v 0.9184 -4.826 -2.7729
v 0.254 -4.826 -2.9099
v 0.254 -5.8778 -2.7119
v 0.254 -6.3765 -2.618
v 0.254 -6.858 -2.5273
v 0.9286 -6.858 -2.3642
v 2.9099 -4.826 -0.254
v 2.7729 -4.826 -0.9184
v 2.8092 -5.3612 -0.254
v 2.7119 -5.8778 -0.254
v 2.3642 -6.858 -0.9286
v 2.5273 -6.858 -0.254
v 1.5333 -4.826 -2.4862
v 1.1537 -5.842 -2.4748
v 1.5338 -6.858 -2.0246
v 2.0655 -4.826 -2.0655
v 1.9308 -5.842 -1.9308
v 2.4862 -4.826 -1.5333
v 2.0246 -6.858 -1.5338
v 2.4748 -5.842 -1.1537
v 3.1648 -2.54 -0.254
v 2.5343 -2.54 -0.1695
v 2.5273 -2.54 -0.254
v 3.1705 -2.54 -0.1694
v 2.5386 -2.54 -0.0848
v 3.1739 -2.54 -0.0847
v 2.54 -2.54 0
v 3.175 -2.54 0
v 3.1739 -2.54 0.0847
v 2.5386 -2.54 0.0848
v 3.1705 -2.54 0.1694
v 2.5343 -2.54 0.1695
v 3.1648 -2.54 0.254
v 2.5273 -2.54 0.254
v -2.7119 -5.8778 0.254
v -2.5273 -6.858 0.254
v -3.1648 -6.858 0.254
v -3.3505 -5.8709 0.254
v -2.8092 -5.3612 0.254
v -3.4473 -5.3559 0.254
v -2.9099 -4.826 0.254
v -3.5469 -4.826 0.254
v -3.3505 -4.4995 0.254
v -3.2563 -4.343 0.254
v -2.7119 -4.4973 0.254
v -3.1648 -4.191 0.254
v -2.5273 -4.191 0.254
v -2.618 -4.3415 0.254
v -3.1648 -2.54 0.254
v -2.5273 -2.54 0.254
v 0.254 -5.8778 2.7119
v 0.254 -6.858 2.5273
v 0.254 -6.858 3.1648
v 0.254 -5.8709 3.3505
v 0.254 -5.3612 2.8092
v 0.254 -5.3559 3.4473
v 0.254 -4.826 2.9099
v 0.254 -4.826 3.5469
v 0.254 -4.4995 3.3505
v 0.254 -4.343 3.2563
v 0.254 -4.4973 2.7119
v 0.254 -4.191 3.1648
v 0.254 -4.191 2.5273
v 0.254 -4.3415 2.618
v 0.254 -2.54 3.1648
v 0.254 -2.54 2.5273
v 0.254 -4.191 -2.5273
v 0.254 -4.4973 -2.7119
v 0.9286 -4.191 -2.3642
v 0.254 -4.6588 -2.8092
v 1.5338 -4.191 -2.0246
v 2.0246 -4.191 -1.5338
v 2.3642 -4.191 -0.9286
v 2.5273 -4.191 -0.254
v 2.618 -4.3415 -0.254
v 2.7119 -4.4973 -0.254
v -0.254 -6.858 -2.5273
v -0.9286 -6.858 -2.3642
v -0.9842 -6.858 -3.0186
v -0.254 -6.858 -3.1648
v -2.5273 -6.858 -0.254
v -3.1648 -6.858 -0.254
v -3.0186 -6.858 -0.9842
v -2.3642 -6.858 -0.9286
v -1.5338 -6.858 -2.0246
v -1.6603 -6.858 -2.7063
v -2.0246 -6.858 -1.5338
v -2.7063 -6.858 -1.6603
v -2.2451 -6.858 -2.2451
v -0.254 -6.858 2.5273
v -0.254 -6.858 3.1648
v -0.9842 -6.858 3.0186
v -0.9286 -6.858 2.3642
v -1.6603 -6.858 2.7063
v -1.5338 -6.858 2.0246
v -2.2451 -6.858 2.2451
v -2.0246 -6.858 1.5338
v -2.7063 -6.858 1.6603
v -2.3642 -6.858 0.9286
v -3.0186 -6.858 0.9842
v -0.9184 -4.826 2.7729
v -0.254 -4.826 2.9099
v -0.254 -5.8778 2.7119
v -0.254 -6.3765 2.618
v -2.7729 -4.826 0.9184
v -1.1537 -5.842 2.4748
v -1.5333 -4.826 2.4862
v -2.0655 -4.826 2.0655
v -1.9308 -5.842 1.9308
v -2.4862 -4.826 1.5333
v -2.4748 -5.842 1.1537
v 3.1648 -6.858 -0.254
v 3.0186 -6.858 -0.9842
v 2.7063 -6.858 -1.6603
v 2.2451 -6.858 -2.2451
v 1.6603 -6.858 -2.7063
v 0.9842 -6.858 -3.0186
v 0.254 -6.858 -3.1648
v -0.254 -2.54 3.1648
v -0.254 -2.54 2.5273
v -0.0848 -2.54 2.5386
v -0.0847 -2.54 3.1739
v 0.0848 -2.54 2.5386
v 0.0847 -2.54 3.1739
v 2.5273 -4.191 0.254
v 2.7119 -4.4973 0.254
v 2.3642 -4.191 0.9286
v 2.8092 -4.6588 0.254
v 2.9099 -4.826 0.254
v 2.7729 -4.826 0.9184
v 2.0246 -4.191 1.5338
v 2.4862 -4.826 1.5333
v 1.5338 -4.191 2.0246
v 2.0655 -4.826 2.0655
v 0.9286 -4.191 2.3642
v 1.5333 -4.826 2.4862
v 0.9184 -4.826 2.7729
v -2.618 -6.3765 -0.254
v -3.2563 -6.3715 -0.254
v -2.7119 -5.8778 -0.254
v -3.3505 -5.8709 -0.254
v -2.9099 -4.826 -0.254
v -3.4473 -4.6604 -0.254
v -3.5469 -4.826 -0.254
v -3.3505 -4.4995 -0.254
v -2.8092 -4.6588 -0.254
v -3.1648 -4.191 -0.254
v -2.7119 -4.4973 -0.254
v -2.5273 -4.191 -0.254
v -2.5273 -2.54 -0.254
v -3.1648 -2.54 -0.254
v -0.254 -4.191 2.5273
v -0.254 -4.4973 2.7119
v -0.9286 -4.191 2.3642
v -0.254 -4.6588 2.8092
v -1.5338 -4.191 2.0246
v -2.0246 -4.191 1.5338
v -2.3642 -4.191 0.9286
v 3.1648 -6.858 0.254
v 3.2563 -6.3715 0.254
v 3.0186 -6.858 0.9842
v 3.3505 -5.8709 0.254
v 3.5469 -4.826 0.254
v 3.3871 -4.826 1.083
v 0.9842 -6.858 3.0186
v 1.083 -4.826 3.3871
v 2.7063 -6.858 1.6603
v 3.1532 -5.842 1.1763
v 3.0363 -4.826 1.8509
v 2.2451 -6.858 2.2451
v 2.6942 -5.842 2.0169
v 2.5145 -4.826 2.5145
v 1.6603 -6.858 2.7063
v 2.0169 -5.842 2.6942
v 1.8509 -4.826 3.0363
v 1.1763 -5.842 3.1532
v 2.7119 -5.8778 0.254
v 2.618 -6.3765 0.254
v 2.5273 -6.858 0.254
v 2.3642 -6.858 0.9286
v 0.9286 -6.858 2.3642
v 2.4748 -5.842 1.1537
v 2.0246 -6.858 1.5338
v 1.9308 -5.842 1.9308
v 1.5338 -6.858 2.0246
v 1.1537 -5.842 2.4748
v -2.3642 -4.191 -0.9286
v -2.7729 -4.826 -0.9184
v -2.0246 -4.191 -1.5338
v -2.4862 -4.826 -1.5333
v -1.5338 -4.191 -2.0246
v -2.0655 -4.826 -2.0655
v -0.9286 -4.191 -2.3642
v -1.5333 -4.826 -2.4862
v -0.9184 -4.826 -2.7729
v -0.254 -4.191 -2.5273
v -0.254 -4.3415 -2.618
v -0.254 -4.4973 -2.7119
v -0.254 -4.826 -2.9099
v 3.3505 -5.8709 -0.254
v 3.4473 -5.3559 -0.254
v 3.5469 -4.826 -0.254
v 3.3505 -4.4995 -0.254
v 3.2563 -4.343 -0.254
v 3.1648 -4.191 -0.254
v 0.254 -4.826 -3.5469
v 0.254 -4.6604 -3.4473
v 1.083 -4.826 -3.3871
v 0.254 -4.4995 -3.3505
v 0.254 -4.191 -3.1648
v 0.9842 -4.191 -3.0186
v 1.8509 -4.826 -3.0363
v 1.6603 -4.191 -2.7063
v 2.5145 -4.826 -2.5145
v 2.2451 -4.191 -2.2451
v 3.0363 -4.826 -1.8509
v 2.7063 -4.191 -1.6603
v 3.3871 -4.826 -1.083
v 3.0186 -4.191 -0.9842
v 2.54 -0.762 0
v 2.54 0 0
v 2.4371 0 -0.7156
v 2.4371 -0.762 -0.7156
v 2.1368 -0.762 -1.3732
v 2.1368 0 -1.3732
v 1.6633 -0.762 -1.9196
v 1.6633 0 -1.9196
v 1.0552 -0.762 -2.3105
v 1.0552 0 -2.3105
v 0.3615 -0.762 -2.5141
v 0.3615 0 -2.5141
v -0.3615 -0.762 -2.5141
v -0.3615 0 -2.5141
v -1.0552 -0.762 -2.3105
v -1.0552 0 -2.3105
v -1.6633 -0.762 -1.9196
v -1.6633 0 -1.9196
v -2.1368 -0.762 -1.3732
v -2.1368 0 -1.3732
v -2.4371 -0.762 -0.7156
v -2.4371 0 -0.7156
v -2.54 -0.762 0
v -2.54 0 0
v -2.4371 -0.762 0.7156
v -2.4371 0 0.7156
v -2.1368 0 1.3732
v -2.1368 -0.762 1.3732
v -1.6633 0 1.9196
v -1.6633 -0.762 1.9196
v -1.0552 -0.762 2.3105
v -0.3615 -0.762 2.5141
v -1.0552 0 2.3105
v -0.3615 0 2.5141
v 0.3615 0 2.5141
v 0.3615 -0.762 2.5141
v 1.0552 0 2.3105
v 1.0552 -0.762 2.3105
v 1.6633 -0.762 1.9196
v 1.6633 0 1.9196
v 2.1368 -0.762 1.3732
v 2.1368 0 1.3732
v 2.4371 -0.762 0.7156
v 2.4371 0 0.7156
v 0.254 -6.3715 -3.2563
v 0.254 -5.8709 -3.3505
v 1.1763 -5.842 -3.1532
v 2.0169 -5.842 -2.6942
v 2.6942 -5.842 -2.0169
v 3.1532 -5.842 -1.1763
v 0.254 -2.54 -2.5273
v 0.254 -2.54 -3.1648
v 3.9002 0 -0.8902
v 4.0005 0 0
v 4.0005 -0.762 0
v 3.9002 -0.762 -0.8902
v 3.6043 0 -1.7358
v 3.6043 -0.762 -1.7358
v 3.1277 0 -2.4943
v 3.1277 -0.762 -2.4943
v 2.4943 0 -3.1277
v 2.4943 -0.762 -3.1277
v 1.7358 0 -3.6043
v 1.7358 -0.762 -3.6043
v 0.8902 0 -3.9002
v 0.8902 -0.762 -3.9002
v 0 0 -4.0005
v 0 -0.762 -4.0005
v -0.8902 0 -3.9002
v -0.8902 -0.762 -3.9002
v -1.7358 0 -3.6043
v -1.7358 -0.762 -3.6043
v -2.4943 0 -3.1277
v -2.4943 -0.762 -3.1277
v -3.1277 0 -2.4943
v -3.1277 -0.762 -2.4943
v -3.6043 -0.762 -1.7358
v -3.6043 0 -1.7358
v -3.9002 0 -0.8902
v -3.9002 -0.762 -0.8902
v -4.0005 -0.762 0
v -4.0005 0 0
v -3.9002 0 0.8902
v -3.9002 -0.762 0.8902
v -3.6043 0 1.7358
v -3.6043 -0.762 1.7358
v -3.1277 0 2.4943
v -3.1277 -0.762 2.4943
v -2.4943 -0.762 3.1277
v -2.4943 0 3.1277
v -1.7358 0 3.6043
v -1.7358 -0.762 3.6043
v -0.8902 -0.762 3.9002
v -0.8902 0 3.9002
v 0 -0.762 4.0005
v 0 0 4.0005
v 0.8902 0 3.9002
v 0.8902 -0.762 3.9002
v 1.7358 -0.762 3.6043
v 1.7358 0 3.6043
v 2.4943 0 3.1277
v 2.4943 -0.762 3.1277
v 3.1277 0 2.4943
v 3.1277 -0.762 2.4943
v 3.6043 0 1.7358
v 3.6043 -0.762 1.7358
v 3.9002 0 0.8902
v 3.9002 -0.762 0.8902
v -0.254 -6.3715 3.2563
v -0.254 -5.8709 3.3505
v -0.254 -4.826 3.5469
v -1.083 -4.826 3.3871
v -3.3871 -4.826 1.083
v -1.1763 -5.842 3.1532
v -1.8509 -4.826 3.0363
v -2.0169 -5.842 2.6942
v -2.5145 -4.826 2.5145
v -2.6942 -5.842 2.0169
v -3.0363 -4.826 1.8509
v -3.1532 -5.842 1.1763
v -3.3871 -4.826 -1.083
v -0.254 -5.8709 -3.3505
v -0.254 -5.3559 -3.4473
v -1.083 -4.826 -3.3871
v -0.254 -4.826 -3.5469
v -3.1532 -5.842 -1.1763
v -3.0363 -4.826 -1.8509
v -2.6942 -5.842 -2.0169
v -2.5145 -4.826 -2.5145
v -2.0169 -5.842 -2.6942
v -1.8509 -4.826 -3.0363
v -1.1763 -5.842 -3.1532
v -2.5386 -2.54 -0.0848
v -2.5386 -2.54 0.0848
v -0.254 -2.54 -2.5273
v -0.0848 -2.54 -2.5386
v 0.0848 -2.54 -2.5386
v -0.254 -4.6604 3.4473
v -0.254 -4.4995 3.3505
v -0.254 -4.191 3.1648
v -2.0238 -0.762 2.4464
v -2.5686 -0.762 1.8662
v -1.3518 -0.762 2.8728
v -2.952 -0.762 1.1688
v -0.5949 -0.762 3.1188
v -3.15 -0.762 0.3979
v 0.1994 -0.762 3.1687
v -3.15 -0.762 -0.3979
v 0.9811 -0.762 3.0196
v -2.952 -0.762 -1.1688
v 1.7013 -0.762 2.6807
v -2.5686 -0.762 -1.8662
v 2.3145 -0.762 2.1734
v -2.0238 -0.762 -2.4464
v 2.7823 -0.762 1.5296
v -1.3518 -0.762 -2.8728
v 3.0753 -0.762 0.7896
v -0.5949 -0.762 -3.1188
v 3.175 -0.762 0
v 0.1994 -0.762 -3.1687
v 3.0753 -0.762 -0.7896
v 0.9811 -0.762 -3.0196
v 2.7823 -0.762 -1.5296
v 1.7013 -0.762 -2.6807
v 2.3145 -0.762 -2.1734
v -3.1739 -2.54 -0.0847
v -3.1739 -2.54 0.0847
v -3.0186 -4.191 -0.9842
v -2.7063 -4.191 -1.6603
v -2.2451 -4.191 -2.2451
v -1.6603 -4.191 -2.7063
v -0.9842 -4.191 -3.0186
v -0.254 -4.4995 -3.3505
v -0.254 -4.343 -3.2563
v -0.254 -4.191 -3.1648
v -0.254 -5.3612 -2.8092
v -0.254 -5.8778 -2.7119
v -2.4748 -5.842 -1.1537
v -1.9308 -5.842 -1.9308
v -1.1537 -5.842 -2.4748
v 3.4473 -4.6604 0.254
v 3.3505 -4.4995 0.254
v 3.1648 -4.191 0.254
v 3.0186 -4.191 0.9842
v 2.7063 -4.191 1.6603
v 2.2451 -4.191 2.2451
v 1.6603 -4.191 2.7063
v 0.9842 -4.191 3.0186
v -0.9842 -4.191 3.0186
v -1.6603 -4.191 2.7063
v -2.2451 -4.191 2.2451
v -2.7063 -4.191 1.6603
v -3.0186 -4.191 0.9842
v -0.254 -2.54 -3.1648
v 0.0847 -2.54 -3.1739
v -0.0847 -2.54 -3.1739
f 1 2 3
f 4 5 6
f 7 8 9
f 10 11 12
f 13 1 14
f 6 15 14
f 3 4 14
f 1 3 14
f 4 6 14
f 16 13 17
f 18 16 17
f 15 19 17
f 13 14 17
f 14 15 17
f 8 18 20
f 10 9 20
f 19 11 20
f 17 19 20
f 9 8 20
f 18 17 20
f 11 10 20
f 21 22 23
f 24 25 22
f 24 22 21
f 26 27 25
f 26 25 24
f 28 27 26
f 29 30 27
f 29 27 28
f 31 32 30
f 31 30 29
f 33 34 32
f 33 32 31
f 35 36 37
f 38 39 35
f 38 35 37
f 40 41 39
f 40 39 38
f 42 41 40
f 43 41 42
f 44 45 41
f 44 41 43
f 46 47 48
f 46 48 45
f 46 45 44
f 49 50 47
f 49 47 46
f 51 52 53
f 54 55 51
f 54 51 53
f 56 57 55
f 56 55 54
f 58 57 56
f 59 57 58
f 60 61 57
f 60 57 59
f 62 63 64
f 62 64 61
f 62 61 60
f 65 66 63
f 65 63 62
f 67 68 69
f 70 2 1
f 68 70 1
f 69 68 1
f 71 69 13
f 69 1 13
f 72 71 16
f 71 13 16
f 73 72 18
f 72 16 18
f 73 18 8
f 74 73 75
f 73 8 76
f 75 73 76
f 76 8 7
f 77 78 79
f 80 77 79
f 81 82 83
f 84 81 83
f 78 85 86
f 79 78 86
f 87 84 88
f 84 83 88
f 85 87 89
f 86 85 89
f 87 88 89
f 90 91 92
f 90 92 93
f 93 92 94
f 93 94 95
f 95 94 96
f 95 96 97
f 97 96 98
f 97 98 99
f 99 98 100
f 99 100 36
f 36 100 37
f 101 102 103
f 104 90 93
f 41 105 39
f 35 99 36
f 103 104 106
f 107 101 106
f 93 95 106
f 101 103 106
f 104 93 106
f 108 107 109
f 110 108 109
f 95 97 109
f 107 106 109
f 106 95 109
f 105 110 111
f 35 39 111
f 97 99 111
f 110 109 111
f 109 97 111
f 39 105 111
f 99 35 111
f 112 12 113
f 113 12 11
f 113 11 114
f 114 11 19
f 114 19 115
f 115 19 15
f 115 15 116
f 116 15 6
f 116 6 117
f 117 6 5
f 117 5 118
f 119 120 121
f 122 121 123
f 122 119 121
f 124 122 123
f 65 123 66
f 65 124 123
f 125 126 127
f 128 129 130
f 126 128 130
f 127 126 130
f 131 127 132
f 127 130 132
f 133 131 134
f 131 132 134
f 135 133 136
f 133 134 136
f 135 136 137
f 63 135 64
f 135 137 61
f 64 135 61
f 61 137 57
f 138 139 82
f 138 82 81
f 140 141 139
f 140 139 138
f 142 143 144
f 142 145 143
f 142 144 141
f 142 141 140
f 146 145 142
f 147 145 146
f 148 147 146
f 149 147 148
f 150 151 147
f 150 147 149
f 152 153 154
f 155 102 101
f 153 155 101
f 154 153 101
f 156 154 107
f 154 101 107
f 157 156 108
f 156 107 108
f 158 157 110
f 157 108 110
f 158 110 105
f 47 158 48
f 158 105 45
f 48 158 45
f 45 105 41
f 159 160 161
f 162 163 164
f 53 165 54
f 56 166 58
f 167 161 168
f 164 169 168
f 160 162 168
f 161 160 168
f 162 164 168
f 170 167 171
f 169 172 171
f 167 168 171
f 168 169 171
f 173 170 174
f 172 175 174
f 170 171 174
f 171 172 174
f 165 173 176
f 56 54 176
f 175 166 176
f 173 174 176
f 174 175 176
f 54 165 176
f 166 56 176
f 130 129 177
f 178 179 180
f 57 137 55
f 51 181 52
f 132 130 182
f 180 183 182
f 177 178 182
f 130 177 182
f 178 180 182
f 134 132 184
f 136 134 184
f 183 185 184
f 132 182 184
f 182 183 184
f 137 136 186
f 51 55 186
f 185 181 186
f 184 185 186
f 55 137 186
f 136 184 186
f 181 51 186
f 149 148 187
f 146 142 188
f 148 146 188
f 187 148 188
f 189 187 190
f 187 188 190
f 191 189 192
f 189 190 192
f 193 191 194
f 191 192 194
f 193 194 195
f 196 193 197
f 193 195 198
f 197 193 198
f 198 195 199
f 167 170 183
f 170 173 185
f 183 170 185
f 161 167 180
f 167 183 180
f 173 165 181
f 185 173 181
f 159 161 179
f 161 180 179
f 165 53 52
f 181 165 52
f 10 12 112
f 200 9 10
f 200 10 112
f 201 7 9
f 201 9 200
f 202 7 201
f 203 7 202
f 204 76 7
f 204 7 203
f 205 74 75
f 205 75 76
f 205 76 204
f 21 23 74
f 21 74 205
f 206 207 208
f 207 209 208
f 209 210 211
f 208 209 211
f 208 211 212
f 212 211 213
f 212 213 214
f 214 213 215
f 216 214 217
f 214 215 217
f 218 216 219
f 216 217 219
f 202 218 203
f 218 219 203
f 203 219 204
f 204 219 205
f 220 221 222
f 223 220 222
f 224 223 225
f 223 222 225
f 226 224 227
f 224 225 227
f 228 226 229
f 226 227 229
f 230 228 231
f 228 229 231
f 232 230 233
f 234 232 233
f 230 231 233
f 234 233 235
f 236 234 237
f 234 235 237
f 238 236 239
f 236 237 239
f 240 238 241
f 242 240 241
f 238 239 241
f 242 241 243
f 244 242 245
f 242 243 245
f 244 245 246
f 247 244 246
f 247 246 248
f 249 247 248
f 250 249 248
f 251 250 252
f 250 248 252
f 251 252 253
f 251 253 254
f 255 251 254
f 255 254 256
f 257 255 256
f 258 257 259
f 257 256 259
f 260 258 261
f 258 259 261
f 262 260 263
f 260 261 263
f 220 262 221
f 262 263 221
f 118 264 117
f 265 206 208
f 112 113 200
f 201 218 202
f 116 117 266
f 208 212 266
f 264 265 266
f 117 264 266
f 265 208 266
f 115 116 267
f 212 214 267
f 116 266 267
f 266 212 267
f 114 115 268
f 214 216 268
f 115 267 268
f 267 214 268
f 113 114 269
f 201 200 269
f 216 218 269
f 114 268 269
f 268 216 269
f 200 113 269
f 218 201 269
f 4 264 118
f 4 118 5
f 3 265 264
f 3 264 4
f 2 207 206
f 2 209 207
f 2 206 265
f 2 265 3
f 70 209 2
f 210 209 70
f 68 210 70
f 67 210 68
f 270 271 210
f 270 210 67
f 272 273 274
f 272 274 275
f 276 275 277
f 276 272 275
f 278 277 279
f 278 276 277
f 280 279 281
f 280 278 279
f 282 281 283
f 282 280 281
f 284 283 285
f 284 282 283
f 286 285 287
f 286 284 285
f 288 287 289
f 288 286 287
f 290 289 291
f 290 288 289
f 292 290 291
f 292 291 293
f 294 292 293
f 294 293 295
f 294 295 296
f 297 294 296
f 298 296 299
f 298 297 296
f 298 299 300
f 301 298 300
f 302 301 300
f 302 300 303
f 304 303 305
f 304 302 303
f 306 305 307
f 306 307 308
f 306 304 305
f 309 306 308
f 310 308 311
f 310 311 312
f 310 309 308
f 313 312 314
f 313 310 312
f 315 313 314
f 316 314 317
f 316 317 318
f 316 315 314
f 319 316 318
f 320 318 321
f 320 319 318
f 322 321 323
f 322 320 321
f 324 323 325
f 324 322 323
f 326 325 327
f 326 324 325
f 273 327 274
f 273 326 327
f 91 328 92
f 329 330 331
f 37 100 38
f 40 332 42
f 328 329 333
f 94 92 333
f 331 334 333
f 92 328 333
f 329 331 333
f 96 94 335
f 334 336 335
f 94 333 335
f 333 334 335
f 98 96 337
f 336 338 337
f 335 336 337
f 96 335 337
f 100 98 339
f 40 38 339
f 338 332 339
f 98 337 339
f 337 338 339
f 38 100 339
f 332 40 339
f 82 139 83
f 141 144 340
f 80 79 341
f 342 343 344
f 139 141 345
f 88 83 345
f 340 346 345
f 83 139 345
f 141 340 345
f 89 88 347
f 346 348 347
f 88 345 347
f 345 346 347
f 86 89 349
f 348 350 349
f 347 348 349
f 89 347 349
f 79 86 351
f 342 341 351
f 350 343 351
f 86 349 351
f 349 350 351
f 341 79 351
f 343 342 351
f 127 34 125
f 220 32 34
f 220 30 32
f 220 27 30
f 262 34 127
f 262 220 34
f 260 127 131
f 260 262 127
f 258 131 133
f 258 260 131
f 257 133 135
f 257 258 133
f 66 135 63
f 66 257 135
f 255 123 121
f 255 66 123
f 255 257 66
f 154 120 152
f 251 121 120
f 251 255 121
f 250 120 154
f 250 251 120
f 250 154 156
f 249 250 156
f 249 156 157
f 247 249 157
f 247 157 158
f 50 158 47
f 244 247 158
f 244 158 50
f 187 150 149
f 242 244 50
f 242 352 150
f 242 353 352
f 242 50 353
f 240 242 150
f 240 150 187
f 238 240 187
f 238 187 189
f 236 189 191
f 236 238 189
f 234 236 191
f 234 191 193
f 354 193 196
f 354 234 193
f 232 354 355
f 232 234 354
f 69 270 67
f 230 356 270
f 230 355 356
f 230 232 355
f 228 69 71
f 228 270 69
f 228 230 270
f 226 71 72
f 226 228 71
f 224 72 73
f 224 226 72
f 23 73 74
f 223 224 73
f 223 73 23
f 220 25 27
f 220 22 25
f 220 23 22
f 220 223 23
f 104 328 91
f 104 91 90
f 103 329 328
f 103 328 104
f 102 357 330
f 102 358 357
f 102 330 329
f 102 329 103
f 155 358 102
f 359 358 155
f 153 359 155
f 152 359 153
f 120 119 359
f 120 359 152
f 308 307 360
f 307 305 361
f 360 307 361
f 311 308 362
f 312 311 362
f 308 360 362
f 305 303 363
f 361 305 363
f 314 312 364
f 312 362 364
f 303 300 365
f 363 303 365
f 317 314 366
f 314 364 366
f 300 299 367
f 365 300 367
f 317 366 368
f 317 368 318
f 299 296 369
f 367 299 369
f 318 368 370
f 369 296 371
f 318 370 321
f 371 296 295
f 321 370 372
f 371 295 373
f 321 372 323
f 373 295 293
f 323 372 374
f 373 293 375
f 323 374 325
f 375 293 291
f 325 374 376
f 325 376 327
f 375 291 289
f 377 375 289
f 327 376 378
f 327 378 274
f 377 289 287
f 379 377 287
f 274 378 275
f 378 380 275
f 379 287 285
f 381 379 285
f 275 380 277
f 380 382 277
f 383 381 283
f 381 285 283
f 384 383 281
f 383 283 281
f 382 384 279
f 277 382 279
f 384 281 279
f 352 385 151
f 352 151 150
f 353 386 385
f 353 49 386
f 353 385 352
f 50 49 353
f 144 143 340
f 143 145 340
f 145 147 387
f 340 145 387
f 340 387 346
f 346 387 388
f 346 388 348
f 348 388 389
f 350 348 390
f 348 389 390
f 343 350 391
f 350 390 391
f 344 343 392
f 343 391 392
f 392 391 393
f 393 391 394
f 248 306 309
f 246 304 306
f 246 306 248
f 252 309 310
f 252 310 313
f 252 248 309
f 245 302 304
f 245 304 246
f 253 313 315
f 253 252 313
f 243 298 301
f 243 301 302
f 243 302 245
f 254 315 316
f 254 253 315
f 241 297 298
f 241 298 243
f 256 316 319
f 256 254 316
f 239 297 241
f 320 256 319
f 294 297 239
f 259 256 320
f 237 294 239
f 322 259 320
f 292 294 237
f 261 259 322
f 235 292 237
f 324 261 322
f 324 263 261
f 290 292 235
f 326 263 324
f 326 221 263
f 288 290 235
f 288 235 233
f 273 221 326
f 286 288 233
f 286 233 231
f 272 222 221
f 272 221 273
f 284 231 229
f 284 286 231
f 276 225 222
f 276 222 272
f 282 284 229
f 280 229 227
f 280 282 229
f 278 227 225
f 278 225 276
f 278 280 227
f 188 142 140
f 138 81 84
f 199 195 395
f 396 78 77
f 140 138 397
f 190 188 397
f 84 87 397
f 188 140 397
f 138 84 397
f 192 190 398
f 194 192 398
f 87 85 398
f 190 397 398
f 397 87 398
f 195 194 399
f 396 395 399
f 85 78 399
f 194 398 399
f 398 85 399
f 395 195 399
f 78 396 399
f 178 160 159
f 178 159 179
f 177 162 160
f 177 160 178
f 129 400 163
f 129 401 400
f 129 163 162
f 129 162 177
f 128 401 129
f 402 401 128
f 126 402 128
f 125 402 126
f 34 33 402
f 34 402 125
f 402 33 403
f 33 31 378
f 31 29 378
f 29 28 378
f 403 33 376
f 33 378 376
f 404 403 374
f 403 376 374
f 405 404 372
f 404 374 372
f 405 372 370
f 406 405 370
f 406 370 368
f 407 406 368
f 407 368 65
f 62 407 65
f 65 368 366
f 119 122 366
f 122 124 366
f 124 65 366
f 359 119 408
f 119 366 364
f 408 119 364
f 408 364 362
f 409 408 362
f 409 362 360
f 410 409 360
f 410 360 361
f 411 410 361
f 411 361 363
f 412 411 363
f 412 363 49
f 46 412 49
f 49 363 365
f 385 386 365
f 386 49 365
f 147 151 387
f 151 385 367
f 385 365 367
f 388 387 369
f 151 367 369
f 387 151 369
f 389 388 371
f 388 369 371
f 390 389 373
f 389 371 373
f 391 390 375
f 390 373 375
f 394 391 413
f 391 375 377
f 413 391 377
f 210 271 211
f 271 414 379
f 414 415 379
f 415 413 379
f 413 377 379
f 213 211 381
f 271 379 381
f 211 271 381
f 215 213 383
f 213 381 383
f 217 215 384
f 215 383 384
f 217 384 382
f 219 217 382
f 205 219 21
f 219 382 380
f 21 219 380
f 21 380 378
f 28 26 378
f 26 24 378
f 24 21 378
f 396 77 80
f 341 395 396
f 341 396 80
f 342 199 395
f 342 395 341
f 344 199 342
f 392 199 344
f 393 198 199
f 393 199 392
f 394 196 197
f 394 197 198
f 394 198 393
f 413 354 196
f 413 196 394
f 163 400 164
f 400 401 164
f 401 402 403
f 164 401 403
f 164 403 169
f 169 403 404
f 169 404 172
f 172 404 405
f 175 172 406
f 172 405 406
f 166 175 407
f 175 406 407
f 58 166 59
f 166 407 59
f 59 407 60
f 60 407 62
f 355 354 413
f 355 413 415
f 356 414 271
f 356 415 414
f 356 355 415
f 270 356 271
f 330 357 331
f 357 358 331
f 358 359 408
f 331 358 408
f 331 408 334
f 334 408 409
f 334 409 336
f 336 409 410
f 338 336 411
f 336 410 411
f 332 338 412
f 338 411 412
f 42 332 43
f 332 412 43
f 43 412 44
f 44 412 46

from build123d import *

# Parameters (mm, degrees)
SKETCH1_R          = 4.0005
SKETCH1_R_2        = 2.54
EXTRUDE1_DEPTH     = 0.762
SKETCH2_R          = 3.175
SKETCH2_R_2        = 2.54
EXTRUDE2_DEPTH     = 3.429
CUT_EXTRUDE1_DEPTH = 5.318


with BuildPart() as part:
    # Sketch1 → Extrude1 (new body)
    with BuildSketch(Plane(origin=(0, 0, 0), x_dir=(1, 0, 0), z_dir=(0, 1, 0))):
        Circle(SKETCH1_R)
        Circle(SKETCH1_R_2, mode=Mode.SUBTRACT)
    extrude(amount=-EXTRUDE1_DEPTH)

    # Sketch2 → Extrude2 (add)
    with BuildSketch(Plane.XZ.offset(0.762)):
        Circle(SKETCH2_R)
        Circle(SKETCH2_R_2, mode=Mode.SUBTRACT)
    extrude(amount=EXTRUDE2_DEPTH)

    # Sketch3 → Revolve1 (revolve)
    with BuildSketch(Plane(origin=(0, 0, 0), x_dir=(0, 0, -1), z_dir=(1, 0, 0))):
        Polygon((-3.175, -4.191), (-2.54, -4.191), (-2.921, -4.826), (-2.54, -6.858), (-3.175, -6.858), (-3.556, -4.826), align=None)
    revolve(axis=Axis((0, 1.21490396, 0), (0, -1, 0)))

    # Sketch5 → Cut-Extrude1 (cut, through all)
    with BuildSketch(Plane.XZ.offset(2.54)):
        Polygon((-0.254, 0.254), (-4.064, 0.254), (-4.064, -0.254), (-0.254, -0.254), (-0.254, -4.064), (0.254, -4.064), (0.254, -0.254), (4.064, -0.254), (4.064, 0.254), (0.254, 0.254), (0.254, 4.064), (-0.254, 4.064), align=None)
    extrude(amount=CUT_EXTRUDE1_DEPTH, mode=Mode.SUBTRACT)


solid = part.part
